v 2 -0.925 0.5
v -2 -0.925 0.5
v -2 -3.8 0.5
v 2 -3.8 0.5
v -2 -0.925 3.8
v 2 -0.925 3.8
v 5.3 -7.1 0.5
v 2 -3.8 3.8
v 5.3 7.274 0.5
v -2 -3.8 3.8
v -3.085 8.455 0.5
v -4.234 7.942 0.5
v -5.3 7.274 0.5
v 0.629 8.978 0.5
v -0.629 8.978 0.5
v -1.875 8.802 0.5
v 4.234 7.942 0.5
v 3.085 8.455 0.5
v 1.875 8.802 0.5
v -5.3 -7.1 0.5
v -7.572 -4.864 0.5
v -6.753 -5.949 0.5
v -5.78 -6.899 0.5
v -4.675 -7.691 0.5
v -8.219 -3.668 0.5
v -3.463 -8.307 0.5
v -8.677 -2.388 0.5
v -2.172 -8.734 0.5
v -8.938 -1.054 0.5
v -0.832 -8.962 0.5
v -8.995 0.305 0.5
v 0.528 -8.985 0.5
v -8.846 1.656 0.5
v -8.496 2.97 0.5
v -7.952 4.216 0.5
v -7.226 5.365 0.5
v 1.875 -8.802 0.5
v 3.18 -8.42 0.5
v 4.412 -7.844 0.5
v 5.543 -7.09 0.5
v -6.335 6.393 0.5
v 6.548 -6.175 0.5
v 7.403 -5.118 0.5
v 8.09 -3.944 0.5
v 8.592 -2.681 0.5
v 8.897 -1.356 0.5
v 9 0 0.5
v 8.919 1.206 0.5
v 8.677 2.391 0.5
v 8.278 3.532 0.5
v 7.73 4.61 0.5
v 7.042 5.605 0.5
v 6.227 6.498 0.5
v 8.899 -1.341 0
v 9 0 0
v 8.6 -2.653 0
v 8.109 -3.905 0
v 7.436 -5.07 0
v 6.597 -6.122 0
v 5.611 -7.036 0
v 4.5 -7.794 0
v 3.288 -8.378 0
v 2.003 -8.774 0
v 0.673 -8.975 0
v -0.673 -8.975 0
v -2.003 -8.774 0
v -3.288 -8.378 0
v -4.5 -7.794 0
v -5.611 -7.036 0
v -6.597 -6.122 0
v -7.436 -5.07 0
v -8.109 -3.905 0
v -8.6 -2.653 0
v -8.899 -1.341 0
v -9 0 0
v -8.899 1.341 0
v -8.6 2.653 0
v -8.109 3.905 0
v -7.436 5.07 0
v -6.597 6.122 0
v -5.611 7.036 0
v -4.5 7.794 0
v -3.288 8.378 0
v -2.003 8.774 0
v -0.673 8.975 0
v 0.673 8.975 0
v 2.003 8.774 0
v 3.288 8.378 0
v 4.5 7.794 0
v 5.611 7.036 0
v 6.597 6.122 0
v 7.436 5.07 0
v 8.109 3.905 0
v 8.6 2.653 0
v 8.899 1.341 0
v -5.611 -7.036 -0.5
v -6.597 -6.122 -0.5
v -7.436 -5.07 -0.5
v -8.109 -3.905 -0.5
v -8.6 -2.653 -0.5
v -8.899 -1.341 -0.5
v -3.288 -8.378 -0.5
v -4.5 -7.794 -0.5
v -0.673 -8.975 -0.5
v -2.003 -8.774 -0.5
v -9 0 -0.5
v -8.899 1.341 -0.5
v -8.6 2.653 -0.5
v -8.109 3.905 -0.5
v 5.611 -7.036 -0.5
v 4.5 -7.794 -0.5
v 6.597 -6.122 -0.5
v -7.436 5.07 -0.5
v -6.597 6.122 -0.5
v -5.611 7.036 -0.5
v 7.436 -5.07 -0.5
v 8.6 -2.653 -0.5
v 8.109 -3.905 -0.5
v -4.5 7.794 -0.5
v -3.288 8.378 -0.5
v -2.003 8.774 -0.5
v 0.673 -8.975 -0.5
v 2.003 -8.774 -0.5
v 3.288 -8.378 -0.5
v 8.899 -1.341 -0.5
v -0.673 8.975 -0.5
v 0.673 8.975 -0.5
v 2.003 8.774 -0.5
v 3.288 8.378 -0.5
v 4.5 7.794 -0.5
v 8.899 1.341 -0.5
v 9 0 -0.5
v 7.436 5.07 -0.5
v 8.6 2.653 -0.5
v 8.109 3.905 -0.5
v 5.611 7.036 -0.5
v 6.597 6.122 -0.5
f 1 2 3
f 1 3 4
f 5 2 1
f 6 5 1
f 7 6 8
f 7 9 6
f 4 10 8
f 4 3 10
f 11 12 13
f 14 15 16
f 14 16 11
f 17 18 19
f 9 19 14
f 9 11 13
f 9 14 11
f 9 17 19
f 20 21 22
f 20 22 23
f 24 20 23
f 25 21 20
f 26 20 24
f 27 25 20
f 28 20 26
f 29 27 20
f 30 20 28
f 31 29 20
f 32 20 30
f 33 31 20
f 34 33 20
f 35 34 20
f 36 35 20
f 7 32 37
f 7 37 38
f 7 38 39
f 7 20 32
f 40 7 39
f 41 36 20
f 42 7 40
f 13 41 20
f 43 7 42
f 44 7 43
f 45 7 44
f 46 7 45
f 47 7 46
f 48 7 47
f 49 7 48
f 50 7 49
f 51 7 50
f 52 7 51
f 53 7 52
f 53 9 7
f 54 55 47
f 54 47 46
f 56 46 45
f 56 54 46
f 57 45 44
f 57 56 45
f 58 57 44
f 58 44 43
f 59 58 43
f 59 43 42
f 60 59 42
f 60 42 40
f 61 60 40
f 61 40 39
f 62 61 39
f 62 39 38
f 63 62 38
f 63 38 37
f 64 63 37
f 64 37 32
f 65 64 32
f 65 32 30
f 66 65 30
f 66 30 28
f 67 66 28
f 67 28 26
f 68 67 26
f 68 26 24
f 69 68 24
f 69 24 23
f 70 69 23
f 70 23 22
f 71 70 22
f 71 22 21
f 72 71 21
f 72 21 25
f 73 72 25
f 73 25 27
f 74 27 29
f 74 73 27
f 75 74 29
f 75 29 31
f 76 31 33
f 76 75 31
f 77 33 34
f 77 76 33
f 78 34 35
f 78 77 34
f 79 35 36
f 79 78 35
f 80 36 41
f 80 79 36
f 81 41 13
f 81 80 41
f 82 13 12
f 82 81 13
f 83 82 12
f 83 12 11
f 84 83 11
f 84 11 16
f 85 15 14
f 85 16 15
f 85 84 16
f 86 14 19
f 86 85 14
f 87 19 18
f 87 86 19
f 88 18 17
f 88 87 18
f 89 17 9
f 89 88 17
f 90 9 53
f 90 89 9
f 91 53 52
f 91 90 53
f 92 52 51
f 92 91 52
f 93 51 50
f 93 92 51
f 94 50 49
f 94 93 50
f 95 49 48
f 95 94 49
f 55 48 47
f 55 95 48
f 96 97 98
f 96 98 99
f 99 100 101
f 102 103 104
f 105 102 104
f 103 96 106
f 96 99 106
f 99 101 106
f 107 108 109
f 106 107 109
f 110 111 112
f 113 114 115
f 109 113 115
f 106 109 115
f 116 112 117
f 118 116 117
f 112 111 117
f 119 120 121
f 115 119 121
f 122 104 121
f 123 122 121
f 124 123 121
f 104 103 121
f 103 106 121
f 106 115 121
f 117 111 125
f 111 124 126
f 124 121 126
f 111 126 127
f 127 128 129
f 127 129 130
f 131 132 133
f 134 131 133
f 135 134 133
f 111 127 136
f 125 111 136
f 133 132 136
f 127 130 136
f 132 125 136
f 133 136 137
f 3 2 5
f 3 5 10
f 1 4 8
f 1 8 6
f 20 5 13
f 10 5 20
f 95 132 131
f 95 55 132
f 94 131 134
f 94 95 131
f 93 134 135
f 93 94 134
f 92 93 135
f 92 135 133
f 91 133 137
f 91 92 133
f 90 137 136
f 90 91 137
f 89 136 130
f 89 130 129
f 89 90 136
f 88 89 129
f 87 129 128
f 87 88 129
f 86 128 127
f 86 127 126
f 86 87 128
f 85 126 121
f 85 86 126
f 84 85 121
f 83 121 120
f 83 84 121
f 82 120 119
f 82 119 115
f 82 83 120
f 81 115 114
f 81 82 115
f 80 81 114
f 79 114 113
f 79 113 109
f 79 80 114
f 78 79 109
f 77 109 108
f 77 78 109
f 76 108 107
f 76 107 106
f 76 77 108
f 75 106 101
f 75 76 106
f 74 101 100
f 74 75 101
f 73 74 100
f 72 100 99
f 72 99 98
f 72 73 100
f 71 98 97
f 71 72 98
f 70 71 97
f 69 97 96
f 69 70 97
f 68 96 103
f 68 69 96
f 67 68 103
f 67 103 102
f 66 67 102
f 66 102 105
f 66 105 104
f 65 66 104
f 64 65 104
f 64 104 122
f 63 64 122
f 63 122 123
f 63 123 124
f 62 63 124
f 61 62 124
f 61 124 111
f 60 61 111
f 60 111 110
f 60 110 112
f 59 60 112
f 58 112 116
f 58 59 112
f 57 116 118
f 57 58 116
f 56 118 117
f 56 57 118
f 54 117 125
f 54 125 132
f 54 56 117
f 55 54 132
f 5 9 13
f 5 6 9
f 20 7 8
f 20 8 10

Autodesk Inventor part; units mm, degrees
ref_plane "YZ Plane" through (0, 0, 0) normal (1, 0, 0) x (0, 1, 0)
ref_plane "XZ Plane" through (0, 0, 0) normal (0, 1, 0) x (-1, 0, 0)
sketch "Skizze1" plane through (0, 0, 0) normal (0, 0, 1) x (1, 0, 0)
  circle A0 centre (0, 0) radius 9
  dimension "d0" = 18
extrude "Extrusion1" add sketch "Skizze1" along normal mid plane 1
sketch "Skizze2" plane through (0, 0, 0.5) normal (0, 0, 1) x (1, 0, 0)
  line L0 (-5.3, -0.925) -> (-2, -0.925)
  line L1 (-2, -0.925) -> (-2, -3.8)
  line L2 (-2, -3.8) -> (2, -3.8)
  line L3 (2, -3.8) -> (2, -0.925)
  line L4 (2, -0.925) -> (5.3, -0.925)
  line L5 (5.3, -0.925) -> (5.3, -7.1)
  line L6 (5.3, -7.1) -> (-5.3, -7.1)
  line L7 (-5.3, -7.1) -> (-5.3, -0.925)
  point P0 (0, 0)
  point P1 (0, -3.8)
  dimension "d3" = 4
  dimension "d4" = 2.875
  dimension "d5" = 3.3
  dimension "d6" = 3.3
  dimension "d17" = 3.8
extrude "Extrusion3" add sketch "Skizze2" along normal blind 3.3
ref_plane "Arbeitsebene3" through (0, 0, 0.5) normal (0, 0, 1) x (1, 0, 0)
sketch "Skizze5" plane through (0, 0, 0.5) normal (0, 0, 1) x (1, 0, 0)
  line L0 (-2, -0.925) -> (-2, -3.8) construction
  line L1 (-2, -3.8) -> (2, -3.8) construction
  line L2 (2, -3.8) -> (2, -0.925) construction
  line L3 (2, -0.925) -> (5.3, -0.925) construction
  line L4 (5.3, -0.925) -> (5.3, -7.1) construction
  line L5 (5.3, -7.1) -> (-5.3, -7.1) construction
  line L6 (-5.3, -7.1) -> (-5.3, -0.925) construction
  line L7 (-5.3, -0.925) -> (-2, -0.925) construction
  circle A0 centre (0, 0) radius 9 construction
  line L8 (-5.3, -0.925) -> (-5.3, 7.2739)
  line L9 (-5.3, 7.2739) -> (5.3, 7.2739)
  circle A1 centre (0, 0) radius 9 projected
  line L10 (5.3, 7.2739) -> (5.3, -0.925)
  line L11 (-5.3, -0.925) -> (5.3, -0.925)
  dimension "d26" = 8.1989
extrude "Extrusion4" add sketch "Skizze5" along normal up to surface (3.3 mm away) contours L8 L9 L10 L11
chamfer "Fase1" distance 3.3 angle 45 3 edges at (0, -7.1, 3.8) (5.3, 0.087, 3.8) (-5.3, 0.087, 3.8)
chamfer "Fase2" distance 3.3 distance2 8.1989 1 edges at (0, 7.2739, 3.8) measured on face at (0.6667, 7.2739, 1.6)
equation "\"d6\" = d5"
equation "\"d28\" = d26"
properties part number "Membran_Platte" material "Stahl"
